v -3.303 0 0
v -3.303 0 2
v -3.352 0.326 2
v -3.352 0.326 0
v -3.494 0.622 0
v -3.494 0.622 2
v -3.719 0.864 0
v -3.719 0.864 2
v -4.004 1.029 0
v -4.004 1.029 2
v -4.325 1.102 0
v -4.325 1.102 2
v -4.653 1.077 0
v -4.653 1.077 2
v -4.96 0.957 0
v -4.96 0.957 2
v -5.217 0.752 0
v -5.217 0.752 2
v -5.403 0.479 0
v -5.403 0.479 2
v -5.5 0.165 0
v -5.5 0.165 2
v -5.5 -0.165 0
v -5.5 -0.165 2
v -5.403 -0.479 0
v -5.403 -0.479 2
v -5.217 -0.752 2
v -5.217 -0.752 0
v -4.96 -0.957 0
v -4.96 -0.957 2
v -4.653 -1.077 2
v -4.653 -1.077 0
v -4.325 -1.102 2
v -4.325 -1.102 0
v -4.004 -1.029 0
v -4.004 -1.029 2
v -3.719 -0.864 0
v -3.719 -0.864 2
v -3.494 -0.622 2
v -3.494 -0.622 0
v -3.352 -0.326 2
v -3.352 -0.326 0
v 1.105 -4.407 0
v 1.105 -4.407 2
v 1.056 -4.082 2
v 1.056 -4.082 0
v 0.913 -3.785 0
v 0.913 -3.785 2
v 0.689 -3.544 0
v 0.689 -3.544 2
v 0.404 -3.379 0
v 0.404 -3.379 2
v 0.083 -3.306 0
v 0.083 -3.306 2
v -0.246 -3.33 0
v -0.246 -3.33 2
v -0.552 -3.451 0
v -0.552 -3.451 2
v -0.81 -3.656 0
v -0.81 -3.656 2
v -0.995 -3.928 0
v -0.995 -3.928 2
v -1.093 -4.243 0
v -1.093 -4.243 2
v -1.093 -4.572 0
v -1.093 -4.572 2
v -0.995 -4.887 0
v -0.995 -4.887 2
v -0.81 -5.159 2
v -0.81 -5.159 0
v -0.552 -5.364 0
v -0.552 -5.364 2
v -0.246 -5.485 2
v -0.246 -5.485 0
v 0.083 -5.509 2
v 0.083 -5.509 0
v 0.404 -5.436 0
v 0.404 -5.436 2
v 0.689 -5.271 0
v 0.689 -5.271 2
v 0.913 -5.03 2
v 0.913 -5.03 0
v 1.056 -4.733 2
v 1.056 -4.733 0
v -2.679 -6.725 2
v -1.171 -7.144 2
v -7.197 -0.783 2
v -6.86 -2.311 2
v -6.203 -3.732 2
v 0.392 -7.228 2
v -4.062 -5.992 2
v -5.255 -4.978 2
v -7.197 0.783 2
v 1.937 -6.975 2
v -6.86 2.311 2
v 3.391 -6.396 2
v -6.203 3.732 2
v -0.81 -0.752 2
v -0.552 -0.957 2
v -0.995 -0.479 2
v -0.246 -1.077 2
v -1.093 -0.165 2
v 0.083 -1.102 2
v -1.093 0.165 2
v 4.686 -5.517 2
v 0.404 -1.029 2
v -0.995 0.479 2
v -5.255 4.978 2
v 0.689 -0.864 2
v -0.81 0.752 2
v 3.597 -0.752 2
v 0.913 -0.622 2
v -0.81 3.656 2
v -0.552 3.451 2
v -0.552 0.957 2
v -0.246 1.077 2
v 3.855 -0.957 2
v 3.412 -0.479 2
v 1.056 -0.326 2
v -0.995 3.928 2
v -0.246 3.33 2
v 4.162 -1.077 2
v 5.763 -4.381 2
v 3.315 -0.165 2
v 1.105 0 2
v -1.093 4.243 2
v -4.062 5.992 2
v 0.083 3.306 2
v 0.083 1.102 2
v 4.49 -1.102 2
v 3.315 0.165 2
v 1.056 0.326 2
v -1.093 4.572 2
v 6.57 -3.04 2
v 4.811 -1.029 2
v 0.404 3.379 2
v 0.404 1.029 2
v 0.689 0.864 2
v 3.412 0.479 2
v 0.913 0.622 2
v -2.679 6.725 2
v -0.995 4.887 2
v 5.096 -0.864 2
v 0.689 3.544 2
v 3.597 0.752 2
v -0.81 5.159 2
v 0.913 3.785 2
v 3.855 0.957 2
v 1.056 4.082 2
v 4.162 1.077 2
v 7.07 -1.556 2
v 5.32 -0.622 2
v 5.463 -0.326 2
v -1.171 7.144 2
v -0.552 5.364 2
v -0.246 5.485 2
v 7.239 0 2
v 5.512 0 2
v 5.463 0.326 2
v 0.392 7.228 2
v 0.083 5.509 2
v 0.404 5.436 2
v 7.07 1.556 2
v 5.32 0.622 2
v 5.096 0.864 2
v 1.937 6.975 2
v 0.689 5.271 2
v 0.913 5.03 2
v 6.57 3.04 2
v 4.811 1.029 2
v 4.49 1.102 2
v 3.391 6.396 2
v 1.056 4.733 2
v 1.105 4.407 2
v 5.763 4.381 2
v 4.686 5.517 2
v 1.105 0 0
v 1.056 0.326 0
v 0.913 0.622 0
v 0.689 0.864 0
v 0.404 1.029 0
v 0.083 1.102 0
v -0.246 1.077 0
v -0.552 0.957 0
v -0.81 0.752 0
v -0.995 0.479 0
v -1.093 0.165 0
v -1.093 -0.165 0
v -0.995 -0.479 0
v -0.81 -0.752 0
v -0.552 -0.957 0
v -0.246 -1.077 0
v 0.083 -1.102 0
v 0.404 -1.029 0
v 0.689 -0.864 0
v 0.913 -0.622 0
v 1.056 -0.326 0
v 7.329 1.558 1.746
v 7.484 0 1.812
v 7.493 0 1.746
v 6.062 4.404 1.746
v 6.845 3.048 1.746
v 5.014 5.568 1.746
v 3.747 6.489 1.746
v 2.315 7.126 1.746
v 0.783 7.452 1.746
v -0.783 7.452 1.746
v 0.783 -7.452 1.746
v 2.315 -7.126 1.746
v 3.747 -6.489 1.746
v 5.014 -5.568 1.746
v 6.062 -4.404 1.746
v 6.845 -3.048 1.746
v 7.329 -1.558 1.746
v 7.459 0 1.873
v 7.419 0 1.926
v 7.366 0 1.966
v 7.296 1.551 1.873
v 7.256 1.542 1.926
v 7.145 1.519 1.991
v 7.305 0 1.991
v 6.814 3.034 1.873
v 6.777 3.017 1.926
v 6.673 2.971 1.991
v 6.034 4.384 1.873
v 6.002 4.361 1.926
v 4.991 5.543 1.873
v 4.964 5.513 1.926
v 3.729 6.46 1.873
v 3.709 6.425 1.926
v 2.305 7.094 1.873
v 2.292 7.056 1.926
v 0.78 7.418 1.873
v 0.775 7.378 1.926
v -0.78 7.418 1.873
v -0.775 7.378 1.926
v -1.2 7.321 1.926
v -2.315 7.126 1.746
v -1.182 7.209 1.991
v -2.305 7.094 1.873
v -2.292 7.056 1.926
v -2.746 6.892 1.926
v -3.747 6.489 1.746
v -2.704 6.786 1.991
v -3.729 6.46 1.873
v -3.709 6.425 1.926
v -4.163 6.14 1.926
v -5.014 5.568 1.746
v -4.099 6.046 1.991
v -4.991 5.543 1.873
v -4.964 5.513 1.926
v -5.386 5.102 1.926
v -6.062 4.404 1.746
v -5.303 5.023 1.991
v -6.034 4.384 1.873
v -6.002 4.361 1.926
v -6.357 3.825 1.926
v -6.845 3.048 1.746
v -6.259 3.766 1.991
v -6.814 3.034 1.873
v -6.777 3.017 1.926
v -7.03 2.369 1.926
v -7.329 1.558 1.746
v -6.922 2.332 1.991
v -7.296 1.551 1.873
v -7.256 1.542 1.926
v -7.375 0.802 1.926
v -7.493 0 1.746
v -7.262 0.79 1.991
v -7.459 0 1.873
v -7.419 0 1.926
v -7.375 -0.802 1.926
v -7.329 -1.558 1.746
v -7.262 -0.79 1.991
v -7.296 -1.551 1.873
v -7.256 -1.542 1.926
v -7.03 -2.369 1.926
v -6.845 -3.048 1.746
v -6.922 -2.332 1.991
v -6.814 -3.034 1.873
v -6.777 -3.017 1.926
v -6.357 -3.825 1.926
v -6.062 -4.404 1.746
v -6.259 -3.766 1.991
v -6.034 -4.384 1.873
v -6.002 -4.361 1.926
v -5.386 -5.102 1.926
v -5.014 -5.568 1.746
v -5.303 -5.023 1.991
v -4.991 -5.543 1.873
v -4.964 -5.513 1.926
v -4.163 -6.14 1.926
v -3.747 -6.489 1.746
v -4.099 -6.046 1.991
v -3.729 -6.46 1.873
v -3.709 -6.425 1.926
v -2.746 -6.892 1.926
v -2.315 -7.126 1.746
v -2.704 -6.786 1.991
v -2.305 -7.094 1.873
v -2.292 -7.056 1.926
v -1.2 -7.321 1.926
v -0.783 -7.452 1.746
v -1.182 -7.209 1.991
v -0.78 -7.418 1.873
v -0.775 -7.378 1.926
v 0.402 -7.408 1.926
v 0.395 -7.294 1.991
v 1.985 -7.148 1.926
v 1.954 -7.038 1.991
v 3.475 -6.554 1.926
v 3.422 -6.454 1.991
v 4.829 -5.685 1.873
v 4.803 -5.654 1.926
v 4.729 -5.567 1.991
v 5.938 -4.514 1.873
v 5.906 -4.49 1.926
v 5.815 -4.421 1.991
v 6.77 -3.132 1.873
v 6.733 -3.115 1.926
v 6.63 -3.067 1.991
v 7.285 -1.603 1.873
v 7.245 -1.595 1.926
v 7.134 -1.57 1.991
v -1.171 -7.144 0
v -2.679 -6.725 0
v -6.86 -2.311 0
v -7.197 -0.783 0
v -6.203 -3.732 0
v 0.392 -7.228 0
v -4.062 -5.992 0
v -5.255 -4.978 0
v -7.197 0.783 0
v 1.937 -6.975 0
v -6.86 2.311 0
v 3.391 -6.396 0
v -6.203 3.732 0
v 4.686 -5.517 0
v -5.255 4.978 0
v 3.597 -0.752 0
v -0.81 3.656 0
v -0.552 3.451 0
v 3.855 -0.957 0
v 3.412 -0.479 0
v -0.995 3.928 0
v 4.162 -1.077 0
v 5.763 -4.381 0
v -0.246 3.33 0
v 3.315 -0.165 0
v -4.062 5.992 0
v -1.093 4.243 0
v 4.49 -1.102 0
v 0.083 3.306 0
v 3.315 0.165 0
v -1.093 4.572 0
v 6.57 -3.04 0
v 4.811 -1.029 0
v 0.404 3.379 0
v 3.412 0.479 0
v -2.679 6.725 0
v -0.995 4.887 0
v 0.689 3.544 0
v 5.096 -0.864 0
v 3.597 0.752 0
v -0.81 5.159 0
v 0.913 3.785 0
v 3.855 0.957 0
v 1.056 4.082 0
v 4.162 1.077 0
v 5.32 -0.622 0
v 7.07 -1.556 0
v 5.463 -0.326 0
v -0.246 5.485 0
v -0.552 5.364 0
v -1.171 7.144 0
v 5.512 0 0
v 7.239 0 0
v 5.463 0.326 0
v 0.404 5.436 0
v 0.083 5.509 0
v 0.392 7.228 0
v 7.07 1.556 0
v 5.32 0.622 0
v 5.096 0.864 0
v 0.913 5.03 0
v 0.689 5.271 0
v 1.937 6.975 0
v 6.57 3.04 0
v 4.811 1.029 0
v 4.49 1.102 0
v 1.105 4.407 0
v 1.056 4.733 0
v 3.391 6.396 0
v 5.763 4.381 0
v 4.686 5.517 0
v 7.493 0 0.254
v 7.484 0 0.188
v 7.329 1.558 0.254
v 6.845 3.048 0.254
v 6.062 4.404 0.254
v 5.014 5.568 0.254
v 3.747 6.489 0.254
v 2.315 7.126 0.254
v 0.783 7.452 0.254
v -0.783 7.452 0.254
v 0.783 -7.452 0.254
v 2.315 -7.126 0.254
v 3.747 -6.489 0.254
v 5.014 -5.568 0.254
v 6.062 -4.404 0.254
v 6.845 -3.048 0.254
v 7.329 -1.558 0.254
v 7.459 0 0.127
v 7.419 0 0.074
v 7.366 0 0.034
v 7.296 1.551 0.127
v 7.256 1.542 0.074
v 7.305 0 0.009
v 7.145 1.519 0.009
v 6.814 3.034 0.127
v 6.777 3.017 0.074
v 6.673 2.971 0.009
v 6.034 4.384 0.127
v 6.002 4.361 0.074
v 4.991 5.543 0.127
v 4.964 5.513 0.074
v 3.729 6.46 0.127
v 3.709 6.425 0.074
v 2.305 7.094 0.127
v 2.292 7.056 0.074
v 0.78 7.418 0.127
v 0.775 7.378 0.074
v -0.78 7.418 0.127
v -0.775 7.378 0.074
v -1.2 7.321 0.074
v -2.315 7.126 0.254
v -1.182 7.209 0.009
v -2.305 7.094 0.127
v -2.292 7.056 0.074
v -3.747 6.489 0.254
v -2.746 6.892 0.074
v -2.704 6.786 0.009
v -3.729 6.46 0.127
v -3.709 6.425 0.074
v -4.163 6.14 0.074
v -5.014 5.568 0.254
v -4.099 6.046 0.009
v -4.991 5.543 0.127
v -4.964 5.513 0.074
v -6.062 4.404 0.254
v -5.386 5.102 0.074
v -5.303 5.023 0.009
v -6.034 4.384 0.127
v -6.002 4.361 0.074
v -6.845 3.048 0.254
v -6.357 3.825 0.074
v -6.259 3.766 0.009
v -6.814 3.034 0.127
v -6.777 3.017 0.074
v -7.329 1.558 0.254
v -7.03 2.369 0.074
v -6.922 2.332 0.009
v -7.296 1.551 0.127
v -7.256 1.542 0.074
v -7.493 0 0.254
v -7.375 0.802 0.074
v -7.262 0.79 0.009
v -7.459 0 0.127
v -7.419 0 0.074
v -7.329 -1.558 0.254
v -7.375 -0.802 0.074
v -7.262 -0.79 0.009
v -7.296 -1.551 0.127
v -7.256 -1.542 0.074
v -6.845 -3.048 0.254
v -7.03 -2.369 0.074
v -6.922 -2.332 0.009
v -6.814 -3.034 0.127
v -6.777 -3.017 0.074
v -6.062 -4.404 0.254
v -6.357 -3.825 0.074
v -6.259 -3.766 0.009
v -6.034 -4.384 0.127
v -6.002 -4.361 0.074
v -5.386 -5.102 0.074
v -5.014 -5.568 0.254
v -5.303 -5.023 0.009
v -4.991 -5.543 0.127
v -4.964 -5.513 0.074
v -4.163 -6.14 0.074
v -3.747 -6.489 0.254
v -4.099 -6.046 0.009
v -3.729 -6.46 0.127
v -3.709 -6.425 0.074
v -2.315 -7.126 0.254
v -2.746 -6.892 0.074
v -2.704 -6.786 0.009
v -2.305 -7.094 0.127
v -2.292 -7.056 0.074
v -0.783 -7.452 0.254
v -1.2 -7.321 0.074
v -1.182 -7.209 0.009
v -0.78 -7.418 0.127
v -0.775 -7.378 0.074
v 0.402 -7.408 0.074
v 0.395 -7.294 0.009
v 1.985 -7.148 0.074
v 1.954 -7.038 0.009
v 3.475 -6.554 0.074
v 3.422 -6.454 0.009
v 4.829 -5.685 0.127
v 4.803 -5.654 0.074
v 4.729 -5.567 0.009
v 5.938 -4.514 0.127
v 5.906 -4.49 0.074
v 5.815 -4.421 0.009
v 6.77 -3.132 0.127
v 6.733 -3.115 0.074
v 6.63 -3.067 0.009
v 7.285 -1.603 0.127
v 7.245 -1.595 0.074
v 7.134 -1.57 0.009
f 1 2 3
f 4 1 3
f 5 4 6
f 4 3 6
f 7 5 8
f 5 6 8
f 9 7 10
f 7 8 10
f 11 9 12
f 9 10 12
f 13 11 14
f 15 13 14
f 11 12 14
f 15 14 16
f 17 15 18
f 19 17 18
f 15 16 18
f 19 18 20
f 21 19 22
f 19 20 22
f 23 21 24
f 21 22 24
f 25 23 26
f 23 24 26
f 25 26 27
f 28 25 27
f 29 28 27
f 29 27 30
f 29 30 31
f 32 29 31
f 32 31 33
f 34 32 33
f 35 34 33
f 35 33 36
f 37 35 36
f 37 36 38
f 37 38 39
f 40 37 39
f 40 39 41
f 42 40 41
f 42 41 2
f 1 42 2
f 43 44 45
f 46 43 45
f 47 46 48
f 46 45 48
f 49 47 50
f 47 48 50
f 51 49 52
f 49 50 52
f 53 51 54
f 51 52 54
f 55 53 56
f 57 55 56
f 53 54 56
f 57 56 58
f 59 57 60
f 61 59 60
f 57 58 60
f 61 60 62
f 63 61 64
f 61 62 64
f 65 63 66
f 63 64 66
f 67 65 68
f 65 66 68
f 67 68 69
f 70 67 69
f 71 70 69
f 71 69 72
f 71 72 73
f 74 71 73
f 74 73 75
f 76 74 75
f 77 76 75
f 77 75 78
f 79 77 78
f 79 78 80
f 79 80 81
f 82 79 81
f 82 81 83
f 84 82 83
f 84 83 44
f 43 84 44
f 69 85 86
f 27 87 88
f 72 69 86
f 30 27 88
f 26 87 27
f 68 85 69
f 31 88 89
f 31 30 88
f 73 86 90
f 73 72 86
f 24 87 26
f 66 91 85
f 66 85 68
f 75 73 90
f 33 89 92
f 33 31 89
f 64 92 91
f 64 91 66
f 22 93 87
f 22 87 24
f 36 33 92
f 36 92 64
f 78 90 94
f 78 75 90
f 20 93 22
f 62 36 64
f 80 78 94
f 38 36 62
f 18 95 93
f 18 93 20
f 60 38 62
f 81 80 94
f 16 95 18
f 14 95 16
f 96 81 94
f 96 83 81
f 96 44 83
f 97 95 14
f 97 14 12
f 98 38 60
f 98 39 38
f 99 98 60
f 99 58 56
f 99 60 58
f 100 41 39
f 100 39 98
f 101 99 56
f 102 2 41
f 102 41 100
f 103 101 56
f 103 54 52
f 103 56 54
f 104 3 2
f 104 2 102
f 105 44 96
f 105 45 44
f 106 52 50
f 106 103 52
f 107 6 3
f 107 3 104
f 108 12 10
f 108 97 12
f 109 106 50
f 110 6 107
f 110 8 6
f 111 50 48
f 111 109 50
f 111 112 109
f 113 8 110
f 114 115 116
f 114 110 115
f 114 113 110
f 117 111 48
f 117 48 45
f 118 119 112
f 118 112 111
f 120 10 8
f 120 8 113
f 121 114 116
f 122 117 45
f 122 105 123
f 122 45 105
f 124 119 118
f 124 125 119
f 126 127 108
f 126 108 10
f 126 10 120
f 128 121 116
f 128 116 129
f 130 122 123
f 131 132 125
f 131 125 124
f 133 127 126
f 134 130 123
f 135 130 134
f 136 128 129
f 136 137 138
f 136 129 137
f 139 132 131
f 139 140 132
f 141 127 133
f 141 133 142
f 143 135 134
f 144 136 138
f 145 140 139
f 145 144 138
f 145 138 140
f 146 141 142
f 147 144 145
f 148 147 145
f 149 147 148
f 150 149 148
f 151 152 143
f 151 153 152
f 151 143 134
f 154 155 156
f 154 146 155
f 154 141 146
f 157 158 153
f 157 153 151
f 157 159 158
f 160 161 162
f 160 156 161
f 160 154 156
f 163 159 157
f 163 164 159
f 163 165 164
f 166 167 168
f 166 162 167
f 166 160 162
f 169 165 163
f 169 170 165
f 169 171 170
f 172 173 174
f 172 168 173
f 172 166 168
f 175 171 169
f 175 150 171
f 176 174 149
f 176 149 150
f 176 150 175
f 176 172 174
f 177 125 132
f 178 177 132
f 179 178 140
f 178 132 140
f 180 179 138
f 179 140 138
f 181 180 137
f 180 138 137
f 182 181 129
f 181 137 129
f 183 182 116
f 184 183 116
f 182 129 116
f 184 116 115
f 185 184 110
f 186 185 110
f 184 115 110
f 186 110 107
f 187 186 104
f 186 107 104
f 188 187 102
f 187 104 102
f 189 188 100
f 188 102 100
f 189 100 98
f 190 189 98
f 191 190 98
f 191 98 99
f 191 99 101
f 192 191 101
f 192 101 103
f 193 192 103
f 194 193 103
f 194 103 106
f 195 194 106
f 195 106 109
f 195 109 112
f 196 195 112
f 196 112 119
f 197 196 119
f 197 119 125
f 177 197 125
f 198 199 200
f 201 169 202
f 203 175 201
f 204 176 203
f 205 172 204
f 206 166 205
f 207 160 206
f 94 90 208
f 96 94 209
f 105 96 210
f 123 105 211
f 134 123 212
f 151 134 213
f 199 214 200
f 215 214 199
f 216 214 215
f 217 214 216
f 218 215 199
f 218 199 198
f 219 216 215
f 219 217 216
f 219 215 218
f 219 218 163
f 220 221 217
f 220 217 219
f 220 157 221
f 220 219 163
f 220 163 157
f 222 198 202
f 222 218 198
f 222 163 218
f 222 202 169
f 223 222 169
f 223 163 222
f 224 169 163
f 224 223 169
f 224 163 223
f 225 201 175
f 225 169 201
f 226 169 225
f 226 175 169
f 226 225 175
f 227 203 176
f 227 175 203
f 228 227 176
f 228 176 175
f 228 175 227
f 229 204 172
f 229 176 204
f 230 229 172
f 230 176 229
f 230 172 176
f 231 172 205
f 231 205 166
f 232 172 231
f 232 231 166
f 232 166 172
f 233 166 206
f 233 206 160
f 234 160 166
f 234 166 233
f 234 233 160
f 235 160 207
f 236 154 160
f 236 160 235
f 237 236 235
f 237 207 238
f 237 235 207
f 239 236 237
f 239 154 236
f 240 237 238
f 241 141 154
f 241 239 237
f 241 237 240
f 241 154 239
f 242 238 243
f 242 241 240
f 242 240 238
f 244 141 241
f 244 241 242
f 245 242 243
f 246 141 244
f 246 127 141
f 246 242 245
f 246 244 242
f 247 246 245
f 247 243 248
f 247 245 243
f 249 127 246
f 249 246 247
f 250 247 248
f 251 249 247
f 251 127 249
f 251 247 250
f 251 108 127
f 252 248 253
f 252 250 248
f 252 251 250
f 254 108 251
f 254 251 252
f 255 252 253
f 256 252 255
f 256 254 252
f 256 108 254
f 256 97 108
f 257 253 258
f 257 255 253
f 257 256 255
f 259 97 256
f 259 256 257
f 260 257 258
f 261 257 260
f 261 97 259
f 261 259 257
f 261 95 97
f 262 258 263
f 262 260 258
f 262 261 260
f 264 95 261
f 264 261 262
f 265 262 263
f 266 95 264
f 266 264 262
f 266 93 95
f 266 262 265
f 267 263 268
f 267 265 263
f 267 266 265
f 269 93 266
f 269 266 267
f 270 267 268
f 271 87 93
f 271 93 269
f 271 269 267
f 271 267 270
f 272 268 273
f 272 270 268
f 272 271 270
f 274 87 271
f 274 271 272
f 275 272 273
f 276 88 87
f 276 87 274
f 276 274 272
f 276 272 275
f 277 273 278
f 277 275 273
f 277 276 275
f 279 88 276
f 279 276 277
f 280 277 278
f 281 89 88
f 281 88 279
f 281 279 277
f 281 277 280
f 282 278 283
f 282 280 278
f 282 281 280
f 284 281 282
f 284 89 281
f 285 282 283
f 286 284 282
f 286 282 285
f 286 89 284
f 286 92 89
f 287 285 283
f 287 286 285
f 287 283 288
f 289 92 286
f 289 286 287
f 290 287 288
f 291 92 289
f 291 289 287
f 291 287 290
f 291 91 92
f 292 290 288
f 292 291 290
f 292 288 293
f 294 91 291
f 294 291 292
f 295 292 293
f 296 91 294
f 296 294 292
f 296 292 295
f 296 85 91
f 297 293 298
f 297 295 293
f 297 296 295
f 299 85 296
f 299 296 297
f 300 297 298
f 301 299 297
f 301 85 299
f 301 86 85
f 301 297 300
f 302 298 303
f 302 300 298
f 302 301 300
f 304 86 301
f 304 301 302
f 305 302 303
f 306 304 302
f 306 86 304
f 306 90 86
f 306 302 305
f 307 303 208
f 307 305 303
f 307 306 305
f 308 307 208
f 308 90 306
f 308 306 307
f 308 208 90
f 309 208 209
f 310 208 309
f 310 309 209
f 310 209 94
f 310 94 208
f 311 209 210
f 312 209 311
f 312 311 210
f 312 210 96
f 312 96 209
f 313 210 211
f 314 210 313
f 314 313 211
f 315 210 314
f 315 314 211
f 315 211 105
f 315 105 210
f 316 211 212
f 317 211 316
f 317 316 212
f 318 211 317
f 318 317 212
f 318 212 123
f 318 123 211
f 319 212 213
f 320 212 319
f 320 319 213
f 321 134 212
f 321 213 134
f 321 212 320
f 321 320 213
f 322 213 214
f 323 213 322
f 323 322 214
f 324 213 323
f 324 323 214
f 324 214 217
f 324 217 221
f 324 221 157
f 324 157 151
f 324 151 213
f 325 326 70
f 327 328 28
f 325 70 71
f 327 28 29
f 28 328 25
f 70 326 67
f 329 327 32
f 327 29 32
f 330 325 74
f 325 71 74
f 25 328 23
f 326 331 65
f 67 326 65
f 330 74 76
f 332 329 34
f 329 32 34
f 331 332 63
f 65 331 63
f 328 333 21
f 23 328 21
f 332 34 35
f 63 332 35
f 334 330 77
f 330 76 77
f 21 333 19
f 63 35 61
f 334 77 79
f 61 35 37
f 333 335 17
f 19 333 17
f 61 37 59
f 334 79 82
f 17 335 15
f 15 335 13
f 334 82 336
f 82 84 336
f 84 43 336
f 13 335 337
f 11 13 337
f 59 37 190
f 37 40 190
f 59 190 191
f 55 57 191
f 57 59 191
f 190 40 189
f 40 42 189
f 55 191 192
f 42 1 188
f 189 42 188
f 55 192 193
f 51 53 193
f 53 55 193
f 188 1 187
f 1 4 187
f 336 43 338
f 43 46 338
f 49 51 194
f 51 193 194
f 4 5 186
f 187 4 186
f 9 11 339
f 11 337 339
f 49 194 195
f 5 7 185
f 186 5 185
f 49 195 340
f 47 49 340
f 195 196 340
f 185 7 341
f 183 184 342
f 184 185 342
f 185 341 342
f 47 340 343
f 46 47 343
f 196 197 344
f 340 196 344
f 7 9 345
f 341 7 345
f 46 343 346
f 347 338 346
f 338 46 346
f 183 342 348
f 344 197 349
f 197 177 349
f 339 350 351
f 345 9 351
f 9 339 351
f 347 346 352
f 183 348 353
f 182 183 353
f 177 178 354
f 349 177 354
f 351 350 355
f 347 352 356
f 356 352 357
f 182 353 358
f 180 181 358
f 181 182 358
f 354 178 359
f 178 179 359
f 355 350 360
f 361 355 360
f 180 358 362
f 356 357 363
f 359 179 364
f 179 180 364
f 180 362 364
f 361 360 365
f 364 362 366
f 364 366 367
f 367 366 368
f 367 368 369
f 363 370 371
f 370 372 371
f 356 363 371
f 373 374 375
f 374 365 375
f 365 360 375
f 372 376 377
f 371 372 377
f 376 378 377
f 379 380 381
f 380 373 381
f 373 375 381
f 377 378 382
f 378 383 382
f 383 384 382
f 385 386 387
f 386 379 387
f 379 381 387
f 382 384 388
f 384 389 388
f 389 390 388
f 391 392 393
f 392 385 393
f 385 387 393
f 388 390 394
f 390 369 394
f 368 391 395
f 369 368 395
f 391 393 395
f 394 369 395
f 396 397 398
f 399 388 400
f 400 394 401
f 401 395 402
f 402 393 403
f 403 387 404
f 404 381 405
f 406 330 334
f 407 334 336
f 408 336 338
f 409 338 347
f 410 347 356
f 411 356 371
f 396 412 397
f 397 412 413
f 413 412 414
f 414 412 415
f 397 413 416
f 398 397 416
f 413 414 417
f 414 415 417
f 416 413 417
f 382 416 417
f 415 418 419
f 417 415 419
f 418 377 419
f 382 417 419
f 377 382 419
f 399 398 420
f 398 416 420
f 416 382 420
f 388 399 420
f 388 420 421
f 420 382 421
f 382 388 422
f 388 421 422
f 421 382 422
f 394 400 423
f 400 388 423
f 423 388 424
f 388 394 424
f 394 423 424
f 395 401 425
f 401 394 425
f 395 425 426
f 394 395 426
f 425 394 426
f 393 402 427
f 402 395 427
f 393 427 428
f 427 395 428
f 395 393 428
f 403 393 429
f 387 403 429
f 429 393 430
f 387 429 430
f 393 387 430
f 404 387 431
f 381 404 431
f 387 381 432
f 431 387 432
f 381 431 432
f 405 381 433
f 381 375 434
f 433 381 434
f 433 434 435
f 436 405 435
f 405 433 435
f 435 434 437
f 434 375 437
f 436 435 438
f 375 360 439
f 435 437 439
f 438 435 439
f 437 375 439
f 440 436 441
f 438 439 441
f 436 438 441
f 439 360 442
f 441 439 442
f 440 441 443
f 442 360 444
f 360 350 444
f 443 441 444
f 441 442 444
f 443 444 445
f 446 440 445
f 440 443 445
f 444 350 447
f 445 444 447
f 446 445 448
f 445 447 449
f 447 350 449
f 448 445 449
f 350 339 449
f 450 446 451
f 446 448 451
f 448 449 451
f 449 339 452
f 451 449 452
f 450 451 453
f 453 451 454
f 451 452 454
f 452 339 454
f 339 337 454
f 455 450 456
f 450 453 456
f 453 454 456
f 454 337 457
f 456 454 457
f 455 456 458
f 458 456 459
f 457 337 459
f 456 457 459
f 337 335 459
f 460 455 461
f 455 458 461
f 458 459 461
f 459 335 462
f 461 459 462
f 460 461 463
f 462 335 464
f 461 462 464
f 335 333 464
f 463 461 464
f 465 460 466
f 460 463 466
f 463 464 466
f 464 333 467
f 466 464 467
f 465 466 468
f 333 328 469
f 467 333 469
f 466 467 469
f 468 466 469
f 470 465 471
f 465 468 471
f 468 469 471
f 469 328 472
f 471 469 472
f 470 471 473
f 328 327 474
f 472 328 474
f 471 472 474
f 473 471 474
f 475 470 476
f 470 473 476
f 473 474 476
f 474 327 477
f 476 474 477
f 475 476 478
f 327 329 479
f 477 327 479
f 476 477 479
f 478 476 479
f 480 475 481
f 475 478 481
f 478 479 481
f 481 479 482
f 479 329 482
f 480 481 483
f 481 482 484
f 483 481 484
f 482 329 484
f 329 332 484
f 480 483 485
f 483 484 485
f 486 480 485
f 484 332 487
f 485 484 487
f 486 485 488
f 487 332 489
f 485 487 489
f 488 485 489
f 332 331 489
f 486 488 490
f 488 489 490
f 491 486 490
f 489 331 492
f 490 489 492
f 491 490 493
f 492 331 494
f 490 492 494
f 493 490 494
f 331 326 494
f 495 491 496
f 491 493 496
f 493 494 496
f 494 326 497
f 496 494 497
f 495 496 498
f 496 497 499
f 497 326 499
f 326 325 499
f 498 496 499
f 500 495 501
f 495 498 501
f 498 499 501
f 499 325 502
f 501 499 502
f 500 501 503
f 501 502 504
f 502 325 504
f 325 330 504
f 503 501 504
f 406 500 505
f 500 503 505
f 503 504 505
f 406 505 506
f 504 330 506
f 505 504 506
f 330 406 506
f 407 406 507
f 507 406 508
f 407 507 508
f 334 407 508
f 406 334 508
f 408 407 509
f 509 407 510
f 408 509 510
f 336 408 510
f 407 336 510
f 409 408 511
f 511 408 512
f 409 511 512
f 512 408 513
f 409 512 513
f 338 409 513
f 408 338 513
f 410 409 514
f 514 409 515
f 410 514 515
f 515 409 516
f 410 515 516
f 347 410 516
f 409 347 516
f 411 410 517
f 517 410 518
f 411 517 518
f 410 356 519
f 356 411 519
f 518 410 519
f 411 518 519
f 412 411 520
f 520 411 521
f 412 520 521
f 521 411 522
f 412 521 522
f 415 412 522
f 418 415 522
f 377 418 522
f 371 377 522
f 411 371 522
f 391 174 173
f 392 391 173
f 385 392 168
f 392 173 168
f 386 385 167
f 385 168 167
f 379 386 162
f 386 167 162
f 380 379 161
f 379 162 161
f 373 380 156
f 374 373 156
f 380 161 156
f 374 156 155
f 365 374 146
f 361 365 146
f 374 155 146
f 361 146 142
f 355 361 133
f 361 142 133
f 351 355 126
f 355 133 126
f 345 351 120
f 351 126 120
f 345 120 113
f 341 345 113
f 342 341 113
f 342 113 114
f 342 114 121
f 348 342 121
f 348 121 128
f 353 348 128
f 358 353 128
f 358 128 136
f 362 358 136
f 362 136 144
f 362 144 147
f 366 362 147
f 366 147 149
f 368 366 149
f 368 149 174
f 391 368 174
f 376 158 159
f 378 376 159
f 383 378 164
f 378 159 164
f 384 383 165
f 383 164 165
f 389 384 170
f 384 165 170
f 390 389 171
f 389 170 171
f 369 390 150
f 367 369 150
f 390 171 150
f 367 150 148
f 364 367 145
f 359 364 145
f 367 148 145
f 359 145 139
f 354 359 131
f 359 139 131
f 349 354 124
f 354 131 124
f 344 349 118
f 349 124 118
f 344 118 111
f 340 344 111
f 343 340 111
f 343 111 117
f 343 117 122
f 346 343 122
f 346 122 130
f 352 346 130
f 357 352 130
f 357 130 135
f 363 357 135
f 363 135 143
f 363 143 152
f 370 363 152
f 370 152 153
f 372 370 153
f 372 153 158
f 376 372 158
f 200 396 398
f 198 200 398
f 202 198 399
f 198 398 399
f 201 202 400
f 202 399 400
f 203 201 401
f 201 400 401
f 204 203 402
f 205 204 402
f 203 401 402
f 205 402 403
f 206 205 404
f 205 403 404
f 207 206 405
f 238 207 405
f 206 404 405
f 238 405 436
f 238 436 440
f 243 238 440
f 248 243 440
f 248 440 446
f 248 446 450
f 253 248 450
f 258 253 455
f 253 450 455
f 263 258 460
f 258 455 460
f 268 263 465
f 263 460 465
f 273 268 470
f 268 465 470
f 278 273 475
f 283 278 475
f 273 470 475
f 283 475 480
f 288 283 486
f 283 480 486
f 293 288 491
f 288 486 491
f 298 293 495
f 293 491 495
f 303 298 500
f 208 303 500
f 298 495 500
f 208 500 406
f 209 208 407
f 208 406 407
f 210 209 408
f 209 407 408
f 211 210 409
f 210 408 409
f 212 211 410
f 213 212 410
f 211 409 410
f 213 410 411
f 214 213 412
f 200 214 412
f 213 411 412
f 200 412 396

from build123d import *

# Parameters (mm, degrees)
F0_R     = 7.493
F1_DEPTH = 2
F2_R     = 1.1049
F3_DEPTH = 25.4
F4_R     = 0.254


with BuildPart() as f1:
    # F0 (on Top) → F1 (new body)
    with BuildSketch(Plane.XY):
        Circle(F0_R)
    extrude(amount=F1_DEPTH)

    # F2 (on face) → F3 (cut)
    with BuildSketch(Plane.XY.offset(2)):
        with Locations((-4.407408, 0)):
            Circle(F2_R)
        Circle(F2_R)
        with Locations((0, 4.407408)):
            Circle(F2_R)
        with Locations((4.407408, 0)):
            Circle(F2_R)
        with Locations((0, -4.407408)):
            Circle(F2_R)
    extrude(amount=-F3_DEPTH, mode=Mode.SUBTRACT)

    # F4
    f4_edges = [f1.edges().sort_by_distance(p)[0] for p in [
        (-7.493, 0, 2),
        (-7.493, 0, 0),
    ]]
    fillet(f4_edges, radius=F4_R)


solid = f1.part
